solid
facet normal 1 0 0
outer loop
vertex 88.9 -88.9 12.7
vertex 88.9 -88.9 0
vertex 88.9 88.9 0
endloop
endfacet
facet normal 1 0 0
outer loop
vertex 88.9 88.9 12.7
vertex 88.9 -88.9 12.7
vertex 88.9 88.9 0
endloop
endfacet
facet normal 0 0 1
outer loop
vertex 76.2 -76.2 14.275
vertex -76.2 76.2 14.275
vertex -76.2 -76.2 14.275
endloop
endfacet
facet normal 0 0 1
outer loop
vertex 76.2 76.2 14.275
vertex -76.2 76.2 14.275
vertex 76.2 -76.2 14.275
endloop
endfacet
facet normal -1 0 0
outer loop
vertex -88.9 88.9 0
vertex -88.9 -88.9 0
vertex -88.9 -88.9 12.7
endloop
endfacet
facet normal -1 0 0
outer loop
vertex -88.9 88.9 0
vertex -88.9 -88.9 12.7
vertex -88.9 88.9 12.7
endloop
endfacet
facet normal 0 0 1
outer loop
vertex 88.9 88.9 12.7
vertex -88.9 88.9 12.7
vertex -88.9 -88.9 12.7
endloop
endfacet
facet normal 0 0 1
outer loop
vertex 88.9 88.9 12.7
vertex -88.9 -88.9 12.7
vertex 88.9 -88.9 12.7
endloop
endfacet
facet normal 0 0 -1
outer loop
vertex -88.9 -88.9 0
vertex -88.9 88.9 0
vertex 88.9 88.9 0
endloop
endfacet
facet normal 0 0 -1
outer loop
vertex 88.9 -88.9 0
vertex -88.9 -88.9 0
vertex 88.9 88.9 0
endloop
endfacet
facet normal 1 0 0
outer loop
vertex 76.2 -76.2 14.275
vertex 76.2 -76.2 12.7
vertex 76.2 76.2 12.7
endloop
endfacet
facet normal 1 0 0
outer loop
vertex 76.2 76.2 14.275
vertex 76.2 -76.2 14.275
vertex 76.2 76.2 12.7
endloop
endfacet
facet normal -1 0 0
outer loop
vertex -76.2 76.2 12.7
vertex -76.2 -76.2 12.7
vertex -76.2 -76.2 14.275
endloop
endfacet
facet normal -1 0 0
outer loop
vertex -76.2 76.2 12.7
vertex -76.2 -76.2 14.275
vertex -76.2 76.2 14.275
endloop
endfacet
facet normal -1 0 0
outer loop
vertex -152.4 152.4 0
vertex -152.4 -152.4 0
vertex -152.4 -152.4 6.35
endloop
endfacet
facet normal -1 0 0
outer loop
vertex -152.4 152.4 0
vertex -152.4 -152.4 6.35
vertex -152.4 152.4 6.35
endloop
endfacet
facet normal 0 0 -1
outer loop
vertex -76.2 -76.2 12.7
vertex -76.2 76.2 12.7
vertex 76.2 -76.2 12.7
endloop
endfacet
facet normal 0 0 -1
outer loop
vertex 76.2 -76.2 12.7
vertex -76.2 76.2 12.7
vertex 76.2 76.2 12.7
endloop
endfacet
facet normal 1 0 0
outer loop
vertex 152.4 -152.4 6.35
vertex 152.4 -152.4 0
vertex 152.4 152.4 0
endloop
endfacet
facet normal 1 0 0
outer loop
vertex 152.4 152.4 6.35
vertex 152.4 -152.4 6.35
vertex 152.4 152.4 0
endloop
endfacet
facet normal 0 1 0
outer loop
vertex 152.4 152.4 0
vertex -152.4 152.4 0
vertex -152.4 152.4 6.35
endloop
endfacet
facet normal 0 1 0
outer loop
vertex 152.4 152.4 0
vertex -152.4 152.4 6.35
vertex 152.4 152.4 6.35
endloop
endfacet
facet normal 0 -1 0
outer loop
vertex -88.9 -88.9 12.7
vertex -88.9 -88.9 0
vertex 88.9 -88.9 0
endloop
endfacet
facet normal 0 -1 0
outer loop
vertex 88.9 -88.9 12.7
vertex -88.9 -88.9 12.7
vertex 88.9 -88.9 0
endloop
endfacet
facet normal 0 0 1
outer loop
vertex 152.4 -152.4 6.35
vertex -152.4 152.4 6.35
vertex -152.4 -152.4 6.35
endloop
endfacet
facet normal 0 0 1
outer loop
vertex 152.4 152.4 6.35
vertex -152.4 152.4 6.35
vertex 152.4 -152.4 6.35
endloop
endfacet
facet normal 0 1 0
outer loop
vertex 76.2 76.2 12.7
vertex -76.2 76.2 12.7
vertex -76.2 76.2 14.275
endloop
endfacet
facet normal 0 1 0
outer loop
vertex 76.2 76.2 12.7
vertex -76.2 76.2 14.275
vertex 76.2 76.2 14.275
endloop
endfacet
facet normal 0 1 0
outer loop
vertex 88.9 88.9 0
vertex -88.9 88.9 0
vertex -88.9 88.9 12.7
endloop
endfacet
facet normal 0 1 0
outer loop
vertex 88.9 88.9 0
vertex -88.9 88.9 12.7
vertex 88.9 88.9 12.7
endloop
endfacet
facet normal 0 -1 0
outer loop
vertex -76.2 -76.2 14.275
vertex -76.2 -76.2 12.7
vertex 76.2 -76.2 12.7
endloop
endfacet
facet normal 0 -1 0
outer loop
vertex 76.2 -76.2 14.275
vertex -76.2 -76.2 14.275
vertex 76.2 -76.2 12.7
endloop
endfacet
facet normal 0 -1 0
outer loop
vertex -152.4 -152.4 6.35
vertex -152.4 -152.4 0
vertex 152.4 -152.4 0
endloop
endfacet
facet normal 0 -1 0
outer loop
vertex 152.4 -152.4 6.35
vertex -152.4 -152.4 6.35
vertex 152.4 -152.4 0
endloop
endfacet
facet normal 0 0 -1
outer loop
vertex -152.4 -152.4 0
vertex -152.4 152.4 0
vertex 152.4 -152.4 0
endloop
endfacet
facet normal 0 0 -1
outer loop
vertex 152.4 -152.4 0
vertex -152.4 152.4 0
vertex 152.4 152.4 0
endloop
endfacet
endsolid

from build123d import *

# Parameters (mm, degrees)
F0_W     = 304.8
F0_H     = 304.8
F1_DEPTH = 6.35
F2_W     = 177.8
F2_H     = 177.8
F3_DEPTH = 12.7
F4_W     = 152.4
F4_H     = 152.4
F5_DEPTH = 1.5748


with BuildPart() as f1:
    # F0 (on Top) → F1 (new body)
    with BuildSketch(Plane.XY):
        Rectangle(F0_W, F0_H)
    extrude(amount=F1_DEPTH)


with BuildPart() as f3:
    # F2 (on Top) → F3 (new body)
    with BuildSketch(Plane.XY):
        Rectangle(F2_W, F2_H)
    extrude(amount=F3_DEPTH)


with BuildPart() as f5:
    # F4 (on face) → F5 (new body)
    with BuildSketch(Plane.XY.offset(12.7)):
        Rectangle(F4_W, F4_H)
    extrude(amount=F5_DEPTH)


solid = Compound([f1.part, f3.part, f5.part])
